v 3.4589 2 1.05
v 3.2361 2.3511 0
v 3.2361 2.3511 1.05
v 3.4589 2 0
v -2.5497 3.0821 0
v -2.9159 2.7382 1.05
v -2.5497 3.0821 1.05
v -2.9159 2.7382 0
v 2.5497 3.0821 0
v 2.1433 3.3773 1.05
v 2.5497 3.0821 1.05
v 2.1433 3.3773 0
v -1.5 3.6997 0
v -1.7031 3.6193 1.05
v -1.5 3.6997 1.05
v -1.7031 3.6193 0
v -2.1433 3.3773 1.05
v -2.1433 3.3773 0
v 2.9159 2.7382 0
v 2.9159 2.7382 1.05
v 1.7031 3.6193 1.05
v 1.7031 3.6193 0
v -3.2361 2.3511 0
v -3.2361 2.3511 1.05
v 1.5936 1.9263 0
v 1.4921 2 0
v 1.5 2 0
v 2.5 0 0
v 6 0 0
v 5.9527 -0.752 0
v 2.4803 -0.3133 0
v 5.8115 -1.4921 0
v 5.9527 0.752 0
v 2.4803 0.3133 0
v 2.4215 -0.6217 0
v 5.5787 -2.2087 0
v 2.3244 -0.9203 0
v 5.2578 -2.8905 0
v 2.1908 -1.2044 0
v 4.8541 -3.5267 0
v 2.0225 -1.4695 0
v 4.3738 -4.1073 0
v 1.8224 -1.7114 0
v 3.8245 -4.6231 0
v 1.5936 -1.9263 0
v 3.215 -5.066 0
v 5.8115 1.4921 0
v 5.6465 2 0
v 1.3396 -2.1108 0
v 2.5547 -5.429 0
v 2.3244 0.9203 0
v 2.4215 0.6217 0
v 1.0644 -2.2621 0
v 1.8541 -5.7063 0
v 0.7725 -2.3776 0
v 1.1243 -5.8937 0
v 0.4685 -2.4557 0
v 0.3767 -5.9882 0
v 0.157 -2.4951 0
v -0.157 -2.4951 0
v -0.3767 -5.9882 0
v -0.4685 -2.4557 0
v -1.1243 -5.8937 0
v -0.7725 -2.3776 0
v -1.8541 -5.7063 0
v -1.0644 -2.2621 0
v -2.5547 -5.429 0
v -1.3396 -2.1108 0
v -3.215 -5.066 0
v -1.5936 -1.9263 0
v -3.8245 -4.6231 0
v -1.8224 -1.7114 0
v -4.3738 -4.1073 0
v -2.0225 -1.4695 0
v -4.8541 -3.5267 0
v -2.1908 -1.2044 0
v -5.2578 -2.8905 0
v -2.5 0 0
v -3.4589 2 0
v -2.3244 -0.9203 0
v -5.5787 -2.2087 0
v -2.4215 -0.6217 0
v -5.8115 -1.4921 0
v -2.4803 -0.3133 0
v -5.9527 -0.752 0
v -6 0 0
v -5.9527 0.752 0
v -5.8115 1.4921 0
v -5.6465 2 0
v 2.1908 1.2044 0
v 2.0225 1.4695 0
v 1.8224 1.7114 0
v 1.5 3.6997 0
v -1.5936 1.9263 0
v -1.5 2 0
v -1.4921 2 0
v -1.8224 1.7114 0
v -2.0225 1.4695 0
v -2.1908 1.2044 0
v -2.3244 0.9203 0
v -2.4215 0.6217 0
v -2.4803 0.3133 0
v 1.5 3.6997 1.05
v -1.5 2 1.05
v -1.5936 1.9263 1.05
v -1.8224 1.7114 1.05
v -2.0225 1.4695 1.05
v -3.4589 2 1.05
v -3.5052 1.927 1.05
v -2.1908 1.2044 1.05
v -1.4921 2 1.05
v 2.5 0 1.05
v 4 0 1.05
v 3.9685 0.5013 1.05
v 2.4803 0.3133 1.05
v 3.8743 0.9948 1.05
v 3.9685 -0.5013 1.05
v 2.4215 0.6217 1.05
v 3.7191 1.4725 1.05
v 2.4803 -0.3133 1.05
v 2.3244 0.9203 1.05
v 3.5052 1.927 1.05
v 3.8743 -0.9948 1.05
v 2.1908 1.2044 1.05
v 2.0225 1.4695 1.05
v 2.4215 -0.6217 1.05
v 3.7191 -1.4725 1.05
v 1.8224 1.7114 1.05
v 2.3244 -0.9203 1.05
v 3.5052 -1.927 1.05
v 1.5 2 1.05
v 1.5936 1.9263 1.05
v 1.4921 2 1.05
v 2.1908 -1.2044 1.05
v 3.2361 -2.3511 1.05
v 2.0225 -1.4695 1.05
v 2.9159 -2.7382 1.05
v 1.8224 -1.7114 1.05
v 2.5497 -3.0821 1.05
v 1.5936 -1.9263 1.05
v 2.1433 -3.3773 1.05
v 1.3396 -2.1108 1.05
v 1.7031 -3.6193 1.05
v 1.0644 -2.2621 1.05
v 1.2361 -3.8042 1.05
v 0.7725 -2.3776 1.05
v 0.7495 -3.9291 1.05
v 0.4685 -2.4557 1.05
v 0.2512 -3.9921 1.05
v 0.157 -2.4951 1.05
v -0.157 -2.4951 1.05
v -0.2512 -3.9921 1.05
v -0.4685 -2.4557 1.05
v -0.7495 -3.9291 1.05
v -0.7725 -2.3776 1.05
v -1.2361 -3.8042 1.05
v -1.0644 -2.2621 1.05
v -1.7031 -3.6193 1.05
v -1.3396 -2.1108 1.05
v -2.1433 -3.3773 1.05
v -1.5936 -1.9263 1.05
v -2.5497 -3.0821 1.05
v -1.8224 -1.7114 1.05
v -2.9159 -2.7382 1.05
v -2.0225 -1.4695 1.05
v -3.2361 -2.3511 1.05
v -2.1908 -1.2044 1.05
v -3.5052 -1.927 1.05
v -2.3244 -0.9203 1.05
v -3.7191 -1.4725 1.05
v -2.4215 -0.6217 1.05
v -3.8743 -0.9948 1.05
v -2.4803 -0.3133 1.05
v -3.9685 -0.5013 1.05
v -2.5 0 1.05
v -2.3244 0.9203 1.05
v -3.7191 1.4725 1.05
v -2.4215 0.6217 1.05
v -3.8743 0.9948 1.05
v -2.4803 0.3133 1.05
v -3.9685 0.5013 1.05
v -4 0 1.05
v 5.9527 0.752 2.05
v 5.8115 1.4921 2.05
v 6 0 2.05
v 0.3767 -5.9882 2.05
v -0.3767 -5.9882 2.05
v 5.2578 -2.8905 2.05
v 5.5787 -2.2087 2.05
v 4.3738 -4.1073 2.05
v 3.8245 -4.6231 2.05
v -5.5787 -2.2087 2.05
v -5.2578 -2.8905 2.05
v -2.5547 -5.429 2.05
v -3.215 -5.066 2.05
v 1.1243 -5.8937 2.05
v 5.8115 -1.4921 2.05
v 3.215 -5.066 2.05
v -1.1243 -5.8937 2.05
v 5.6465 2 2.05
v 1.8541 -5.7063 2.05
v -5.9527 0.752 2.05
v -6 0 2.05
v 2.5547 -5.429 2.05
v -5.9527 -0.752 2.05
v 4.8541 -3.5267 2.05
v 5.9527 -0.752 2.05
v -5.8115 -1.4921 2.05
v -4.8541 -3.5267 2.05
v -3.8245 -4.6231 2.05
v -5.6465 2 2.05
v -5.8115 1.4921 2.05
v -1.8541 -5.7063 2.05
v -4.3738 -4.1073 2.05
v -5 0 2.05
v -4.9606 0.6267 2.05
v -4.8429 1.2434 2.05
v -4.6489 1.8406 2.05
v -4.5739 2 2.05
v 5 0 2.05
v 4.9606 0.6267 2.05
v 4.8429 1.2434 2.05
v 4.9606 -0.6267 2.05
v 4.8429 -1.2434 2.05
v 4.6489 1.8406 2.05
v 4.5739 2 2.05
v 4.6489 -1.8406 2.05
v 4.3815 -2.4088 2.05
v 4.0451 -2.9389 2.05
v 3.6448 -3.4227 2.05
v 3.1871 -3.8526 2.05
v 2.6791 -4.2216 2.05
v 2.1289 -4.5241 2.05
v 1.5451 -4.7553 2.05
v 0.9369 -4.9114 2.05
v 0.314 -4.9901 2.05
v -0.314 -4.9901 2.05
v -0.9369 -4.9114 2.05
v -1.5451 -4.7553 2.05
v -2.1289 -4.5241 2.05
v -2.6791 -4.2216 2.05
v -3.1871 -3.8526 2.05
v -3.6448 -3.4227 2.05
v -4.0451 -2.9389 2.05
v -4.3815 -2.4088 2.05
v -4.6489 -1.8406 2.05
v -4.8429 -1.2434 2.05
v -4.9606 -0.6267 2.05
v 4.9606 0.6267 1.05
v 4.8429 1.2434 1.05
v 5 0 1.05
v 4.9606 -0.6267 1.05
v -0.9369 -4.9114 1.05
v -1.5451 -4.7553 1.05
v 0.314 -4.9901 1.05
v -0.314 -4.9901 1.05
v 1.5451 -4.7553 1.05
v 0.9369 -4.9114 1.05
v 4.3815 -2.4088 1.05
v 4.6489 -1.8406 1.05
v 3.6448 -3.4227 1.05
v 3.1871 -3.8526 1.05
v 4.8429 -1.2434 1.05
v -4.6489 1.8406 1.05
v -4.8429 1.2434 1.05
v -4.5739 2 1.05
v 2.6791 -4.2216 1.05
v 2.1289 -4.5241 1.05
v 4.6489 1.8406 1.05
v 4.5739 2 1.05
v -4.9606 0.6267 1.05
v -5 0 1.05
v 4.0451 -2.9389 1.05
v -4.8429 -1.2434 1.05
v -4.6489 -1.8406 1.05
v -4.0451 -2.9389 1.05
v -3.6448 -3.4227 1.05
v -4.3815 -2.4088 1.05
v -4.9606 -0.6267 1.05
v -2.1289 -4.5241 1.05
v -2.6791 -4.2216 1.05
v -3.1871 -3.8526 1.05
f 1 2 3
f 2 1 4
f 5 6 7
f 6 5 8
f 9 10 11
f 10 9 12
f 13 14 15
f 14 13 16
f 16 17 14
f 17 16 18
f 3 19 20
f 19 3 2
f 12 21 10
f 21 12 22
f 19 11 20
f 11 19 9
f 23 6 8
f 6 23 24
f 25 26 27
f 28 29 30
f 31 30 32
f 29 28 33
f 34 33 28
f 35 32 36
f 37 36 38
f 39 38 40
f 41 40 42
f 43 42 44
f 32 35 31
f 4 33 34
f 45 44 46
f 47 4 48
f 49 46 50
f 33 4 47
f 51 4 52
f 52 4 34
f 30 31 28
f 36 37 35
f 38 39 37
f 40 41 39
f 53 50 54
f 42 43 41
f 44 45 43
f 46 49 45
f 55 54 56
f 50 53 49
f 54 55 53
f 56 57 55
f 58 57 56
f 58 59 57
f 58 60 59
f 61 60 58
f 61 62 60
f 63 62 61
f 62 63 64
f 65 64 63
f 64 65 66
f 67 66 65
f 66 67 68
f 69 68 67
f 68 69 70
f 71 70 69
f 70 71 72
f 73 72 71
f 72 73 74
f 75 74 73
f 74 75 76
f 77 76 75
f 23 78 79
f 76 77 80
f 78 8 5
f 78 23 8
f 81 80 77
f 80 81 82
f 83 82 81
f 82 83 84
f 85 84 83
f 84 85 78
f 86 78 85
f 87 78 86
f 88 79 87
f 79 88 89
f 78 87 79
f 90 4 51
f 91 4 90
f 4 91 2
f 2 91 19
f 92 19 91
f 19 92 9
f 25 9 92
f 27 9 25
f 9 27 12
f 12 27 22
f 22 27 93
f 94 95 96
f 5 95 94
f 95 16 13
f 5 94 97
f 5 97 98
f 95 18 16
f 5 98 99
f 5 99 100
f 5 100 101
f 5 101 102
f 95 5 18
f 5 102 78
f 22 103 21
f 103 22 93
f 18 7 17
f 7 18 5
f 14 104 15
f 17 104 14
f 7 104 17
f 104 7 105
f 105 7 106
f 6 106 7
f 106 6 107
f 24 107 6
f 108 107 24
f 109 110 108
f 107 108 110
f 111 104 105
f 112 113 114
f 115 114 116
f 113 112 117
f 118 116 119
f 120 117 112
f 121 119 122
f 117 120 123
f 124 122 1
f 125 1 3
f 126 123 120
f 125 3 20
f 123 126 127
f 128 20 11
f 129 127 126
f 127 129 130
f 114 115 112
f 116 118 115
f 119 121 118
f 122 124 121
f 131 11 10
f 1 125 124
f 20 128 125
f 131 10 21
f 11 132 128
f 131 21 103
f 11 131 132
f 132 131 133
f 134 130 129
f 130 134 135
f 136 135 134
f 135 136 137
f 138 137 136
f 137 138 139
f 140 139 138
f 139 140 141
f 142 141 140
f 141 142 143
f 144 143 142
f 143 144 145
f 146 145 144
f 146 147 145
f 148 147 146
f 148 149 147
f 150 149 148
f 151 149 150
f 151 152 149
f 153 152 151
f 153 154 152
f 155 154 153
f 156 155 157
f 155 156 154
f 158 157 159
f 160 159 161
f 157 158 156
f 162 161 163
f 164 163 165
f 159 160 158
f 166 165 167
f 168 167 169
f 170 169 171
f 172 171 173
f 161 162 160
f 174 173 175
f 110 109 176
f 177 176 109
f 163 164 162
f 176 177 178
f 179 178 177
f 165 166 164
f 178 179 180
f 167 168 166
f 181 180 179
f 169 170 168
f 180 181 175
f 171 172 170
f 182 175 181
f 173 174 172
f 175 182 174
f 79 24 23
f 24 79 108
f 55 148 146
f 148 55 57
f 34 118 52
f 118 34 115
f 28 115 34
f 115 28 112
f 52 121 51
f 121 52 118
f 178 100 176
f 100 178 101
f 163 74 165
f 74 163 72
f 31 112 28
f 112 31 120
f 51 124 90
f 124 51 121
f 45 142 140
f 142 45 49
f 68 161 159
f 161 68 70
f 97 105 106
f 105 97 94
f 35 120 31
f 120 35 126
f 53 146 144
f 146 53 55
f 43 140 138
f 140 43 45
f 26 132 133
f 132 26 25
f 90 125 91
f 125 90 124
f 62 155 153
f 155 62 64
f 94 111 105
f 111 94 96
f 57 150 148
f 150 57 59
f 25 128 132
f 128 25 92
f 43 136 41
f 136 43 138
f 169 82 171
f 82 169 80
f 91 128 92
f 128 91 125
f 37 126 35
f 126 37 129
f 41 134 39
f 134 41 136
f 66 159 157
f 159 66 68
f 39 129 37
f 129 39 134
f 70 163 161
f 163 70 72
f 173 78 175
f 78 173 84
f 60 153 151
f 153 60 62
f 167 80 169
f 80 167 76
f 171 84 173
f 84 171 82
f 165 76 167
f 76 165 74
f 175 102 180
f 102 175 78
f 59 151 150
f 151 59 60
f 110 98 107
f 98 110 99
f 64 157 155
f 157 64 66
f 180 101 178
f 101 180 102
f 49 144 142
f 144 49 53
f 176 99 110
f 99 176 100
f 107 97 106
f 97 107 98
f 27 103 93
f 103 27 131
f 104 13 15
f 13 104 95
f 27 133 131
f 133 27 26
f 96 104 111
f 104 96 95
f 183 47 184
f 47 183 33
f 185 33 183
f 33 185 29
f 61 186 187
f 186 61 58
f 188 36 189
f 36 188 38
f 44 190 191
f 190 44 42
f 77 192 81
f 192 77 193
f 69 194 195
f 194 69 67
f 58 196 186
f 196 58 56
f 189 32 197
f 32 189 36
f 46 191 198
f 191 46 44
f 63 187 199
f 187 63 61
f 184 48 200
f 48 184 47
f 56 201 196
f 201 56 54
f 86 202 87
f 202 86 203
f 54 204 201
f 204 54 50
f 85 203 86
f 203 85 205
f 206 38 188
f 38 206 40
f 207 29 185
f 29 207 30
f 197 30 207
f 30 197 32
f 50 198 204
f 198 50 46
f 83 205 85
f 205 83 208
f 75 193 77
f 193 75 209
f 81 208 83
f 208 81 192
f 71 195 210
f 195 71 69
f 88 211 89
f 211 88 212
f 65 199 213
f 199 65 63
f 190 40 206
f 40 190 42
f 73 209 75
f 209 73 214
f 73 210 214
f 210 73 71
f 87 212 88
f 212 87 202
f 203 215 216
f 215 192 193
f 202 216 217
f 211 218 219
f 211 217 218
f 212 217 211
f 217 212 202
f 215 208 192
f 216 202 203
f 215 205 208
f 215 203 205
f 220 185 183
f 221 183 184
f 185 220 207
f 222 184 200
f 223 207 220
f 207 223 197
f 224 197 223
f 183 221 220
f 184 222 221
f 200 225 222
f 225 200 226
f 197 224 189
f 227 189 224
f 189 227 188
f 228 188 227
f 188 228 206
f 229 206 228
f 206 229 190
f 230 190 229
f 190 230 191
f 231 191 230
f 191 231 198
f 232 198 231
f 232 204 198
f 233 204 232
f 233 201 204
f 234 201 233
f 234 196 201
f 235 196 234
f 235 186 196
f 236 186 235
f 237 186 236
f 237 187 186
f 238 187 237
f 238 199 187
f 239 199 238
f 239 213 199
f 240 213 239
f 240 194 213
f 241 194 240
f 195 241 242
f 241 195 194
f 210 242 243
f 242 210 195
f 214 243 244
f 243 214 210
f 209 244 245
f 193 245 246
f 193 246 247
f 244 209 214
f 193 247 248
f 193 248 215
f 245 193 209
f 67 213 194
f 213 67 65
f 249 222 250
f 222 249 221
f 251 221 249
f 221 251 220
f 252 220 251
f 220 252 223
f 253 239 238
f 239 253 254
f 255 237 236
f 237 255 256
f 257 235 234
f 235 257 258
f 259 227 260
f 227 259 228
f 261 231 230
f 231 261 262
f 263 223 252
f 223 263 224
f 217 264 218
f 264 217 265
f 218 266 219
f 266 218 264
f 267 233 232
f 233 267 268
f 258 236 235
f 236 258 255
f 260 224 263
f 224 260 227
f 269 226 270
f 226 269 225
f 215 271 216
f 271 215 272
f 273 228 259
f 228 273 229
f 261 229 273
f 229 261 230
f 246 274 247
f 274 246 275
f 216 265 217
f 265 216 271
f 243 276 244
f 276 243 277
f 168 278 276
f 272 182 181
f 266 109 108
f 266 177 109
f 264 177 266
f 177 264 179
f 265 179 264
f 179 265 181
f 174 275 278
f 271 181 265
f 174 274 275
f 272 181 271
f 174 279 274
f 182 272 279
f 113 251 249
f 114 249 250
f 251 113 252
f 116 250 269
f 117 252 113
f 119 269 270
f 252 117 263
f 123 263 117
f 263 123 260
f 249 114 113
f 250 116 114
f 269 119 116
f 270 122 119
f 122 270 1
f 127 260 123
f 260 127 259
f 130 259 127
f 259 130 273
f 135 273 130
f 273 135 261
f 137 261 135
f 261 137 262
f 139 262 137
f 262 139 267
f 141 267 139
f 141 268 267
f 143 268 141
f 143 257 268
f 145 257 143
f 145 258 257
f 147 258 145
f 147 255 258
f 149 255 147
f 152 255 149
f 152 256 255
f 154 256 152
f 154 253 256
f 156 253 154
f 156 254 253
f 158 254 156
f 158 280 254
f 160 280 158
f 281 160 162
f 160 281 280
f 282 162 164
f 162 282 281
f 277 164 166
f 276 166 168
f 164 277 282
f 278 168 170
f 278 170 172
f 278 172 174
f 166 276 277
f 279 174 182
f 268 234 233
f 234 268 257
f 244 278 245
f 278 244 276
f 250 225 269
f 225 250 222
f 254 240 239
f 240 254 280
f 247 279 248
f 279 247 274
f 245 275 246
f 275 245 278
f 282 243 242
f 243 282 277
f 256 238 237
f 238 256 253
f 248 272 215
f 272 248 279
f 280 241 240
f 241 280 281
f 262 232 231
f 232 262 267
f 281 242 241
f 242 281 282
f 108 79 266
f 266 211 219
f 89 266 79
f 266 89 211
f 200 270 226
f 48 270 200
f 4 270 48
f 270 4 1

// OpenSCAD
h=1.05;

$fn=50;

difference() {
    cylinder(d=8,h=h);
    cylinder(d=5, h=h);
    translate([-3/2, 2, 0]) cube(3);
}

t=1;

difference() {
    cylinder(d=10+t*2,h=h+1);
    translate([0, 0, h]) cylinder(d=10, h=1);
    cylinder(d=8, h=h);
    translate([-(10+t*2)/2, 2, 0]) cube(10+t*2);
}
